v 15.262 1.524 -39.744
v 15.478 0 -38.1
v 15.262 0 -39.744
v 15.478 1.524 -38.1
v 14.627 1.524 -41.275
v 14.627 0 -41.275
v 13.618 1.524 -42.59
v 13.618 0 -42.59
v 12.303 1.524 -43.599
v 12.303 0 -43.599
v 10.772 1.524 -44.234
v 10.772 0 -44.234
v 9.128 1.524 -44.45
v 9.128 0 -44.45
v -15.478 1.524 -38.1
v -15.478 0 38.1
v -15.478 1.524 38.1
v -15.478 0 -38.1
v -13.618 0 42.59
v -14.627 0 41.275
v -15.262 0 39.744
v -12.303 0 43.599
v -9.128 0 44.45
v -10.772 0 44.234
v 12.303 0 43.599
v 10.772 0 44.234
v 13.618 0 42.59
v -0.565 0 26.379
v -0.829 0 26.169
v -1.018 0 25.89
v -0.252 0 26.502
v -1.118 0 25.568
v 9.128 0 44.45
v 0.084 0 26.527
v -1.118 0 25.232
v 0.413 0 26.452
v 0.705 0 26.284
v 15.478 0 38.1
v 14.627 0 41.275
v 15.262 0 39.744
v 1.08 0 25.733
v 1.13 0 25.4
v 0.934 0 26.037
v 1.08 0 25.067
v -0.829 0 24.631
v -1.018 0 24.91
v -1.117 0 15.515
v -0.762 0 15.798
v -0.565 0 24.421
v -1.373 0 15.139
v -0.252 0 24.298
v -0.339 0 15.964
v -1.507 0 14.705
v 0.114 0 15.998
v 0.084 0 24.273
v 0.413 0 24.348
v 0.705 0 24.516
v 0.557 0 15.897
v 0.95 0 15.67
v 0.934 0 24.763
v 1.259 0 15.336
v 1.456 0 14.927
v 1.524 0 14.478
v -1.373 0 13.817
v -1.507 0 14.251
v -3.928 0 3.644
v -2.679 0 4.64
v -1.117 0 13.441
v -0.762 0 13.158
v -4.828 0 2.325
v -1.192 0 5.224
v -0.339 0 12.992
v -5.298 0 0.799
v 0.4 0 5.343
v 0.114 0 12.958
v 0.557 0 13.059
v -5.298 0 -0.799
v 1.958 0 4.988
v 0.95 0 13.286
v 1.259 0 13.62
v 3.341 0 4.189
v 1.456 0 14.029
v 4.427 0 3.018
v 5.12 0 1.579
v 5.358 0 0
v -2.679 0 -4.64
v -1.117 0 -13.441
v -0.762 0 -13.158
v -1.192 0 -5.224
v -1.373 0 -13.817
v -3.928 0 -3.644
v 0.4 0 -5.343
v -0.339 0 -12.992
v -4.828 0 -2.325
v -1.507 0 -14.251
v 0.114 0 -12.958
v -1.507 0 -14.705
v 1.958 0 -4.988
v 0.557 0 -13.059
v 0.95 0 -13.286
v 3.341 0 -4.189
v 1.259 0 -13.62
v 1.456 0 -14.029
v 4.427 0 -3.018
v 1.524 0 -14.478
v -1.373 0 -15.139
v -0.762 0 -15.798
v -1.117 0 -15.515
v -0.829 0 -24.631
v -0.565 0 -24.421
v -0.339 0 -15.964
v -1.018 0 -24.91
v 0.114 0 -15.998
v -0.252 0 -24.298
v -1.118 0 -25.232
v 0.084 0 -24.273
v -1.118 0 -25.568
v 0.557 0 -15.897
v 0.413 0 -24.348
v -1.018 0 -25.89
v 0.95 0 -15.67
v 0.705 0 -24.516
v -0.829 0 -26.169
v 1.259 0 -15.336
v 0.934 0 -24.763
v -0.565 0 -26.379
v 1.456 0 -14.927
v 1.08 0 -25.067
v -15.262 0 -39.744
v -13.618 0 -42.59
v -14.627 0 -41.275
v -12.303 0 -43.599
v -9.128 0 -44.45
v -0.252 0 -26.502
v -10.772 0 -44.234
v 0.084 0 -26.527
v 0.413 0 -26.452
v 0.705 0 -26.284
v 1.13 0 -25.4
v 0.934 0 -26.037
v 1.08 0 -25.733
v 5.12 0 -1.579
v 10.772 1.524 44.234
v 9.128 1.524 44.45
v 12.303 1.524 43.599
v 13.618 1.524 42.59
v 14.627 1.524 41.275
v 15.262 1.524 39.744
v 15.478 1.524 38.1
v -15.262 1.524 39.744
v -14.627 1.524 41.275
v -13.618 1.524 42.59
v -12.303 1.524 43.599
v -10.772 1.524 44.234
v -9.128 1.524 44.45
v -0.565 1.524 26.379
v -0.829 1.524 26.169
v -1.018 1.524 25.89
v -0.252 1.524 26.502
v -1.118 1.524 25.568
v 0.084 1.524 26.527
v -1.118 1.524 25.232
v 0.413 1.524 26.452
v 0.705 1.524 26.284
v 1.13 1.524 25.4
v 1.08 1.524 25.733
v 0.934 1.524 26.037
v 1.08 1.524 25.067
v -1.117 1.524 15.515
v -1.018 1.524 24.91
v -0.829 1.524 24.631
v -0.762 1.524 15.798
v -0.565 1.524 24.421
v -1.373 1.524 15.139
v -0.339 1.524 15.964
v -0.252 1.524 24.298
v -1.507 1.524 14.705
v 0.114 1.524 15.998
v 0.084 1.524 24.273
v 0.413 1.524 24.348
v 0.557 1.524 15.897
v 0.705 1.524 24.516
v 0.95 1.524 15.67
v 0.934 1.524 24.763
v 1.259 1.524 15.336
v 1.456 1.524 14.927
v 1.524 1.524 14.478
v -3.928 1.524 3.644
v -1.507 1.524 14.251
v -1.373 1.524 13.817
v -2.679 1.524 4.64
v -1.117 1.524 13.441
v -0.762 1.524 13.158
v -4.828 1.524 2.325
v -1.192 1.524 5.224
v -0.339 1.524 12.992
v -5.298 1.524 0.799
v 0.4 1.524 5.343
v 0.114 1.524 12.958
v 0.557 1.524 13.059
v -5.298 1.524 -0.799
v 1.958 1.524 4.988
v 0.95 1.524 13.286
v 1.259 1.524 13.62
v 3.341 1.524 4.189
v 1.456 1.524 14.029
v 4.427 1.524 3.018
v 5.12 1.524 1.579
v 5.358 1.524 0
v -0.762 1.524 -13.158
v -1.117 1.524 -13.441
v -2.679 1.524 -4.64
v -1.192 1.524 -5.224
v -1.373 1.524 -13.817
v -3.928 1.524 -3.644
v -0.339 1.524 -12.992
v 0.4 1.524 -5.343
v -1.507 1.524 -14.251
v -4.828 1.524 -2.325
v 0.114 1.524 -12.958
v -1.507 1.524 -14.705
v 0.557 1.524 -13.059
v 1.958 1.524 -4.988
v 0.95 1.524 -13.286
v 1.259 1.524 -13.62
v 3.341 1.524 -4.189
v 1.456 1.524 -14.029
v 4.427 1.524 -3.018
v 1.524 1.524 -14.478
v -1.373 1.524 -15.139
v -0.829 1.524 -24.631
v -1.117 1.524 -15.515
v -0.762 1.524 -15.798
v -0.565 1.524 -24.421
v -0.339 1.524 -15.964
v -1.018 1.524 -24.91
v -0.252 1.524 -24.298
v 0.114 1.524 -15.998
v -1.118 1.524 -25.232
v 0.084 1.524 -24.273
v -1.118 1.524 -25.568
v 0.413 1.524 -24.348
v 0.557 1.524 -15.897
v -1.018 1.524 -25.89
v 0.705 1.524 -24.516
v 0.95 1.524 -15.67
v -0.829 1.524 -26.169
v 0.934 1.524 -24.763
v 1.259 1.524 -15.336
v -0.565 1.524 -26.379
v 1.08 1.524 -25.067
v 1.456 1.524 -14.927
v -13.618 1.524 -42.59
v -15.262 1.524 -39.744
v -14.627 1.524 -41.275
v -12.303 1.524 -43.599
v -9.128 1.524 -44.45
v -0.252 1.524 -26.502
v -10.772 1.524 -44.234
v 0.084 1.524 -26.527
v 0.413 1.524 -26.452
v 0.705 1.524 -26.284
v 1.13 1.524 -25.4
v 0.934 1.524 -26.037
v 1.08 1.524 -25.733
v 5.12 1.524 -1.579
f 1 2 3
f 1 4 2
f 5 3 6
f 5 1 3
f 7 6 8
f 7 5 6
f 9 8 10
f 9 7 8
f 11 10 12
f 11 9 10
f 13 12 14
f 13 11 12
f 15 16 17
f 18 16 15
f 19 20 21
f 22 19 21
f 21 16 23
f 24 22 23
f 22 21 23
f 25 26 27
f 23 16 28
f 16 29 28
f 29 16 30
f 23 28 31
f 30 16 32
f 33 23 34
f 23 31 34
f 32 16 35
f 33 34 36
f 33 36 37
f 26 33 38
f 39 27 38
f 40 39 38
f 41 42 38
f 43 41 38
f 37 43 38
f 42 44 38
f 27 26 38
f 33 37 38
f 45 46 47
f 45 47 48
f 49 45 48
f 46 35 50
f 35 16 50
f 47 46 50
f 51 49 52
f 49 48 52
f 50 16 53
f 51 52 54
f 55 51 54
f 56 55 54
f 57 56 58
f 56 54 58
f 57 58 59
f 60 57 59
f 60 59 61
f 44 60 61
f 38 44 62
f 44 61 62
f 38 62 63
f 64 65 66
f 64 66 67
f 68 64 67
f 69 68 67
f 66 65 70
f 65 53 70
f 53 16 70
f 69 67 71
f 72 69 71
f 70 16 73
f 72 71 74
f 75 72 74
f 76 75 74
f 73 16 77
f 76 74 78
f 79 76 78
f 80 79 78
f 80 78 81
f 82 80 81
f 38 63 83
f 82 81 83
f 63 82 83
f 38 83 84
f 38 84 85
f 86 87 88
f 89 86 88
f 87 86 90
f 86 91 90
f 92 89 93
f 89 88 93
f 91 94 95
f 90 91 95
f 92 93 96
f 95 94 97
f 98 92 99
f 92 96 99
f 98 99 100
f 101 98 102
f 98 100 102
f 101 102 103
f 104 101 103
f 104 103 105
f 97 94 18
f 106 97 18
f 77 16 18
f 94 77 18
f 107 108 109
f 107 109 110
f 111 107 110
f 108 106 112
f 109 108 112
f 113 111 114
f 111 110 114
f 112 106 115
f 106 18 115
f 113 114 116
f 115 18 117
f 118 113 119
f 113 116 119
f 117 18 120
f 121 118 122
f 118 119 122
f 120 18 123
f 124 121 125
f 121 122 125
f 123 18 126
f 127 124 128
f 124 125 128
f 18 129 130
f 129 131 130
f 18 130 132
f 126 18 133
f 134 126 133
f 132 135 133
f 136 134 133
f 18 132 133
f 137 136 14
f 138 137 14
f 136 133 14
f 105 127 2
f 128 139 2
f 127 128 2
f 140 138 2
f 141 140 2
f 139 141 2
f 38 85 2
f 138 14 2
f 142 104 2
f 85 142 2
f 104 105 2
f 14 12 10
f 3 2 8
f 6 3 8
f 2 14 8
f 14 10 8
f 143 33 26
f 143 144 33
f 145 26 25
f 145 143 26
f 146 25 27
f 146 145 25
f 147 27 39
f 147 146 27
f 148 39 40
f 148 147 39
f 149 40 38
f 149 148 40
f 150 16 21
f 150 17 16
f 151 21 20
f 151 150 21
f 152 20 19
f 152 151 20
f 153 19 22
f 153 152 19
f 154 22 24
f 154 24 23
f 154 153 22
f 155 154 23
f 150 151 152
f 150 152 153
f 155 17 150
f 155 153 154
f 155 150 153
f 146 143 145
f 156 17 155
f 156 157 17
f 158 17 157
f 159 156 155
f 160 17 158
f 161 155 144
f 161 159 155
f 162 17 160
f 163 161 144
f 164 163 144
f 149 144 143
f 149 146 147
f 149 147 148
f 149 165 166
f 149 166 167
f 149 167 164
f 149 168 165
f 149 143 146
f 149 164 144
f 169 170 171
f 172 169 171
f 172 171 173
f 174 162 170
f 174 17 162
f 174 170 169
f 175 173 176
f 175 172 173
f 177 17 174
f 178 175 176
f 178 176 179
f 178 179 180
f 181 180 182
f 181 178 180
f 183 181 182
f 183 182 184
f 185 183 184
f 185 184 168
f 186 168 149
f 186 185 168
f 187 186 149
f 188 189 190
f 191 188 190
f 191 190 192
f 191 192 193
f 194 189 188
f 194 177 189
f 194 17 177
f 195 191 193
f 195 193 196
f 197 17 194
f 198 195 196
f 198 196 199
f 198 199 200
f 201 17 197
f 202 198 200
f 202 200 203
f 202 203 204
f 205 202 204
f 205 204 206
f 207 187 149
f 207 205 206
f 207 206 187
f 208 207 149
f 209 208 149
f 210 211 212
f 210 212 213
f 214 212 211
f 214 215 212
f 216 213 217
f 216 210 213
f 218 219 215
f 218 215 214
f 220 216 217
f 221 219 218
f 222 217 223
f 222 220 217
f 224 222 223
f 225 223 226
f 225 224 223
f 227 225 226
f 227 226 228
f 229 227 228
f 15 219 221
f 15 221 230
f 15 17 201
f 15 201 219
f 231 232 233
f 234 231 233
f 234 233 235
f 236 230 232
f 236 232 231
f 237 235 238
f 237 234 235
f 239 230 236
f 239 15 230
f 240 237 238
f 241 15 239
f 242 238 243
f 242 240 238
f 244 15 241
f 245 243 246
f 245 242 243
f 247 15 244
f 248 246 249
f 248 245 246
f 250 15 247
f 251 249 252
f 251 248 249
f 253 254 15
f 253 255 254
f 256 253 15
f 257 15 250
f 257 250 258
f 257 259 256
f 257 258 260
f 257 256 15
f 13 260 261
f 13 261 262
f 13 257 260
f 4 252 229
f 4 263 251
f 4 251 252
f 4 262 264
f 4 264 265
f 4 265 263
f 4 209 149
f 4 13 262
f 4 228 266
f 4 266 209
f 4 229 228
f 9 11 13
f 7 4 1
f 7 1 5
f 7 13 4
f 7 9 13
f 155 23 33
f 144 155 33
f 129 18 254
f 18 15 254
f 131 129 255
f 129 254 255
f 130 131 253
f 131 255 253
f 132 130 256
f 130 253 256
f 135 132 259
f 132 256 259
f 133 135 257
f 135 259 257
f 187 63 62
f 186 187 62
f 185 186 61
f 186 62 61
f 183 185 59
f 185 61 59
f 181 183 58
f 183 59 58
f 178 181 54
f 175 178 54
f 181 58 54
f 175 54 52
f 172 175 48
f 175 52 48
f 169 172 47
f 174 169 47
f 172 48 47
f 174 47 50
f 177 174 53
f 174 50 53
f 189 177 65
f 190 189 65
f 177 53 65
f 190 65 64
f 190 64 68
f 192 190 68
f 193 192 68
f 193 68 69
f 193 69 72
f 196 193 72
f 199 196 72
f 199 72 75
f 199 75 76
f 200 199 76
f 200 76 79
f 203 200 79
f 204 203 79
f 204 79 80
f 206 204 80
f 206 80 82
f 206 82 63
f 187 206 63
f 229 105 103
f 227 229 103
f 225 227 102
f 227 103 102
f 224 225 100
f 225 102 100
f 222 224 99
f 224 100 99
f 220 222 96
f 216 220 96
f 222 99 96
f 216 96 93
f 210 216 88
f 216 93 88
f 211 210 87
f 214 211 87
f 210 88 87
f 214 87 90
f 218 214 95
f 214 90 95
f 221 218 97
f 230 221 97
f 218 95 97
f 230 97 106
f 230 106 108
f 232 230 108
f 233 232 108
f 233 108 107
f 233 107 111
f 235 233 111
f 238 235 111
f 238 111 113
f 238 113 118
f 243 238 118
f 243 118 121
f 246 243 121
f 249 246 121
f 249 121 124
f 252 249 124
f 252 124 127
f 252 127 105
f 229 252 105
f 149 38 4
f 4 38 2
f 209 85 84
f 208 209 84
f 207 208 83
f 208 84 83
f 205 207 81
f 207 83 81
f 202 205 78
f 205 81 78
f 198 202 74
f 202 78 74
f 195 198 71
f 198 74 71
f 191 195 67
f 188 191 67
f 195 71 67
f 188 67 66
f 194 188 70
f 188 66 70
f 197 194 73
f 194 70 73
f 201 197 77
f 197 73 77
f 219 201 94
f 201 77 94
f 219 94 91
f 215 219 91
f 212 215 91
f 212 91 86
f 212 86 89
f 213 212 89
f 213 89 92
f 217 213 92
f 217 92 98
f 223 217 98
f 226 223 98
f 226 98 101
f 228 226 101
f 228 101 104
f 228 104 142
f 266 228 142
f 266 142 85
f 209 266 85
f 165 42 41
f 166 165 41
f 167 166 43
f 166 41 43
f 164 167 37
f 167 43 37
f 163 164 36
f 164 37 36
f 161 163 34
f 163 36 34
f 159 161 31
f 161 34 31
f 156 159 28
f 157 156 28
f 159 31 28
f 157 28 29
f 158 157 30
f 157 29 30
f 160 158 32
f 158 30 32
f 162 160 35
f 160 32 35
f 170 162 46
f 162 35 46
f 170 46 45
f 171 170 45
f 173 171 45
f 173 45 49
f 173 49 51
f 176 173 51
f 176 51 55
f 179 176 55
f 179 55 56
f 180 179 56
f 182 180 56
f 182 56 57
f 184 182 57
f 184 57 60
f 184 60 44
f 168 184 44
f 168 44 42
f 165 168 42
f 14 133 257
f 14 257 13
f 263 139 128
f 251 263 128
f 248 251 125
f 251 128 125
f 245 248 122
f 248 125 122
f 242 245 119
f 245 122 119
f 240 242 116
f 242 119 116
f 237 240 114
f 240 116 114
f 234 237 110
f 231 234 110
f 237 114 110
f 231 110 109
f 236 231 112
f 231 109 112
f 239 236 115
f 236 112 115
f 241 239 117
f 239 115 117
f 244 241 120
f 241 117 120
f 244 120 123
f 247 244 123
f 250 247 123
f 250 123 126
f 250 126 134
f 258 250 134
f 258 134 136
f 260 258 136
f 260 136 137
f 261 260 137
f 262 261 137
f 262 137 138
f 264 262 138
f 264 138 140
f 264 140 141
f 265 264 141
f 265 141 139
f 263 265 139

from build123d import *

# Parameters (mm, degrees)
SKETCH1_W               = 30.95625
SKETCH1_H               = 88.9
BOSS_EXTRUDE1_DEPTH     = 1.524
FILLET1_R               = 6.35
SKETCH6_R               = 1.524
CUT_EXTRUDE1_DEPTH      = 2.524
F_4_40_TAPPED_HOLE1_D   = 2.2606
F_1_2_13_TAPPED_HOLE1_D = 10.71626


with BuildPart() as part:
    # Sketch1 → Boss-Extrude1 (new body)
    with BuildSketch(Plane(origin=(0, 0, 0), x_dir=(1, 0, 0), z_dir=(0, 1, 0))):
        Rectangle(SKETCH1_W, SKETCH1_H)
    extrude(amount=BOSS_EXTRUDE1_DEPTH)

    # Fillet1
    fillet1_edges = [part.edges().sort_by_distance(p)[0] for p in [
        (15.478125, 0.762, -44.45),
        (15.478125, 0.762, 44.45),
        (-15.478125, 0.762, 44.45),
        (-15.478125, 0.762, -44.45),
    ]]
    fillet(fillet1_edges, radius=FILLET1_R)

    # Sketch6 → Cut-Extrude1 (cut, through all)
    with BuildSketch(Plane.XZ):
        with Locations((0, 14.478)):
            Circle(SKETCH6_R)
        with Locations((0, -14.478)):
            Circle(SKETCH6_R)
    extrude(amount=-CUT_EXTRUDE1_DEPTH, mode=Mode.SUBTRACT)

    # #4-40 Tapped Hole1 (through all)
    with Locations(Plane(origin=(0, 1.524, 0), x_dir=(-1, 0, 0), z_dir=(0, 1, 0))):
        with Locations((0, 25.4), (0, -25.4)):
            Hole(F_4_40_TAPPED_HOLE1_D / 2)

    # 1/2-13 Tapped Hole1 (through all)
    with Locations(Plane(origin=(0, 1.524, 0), x_dir=(-1, 0, 0), z_dir=(0, 1, 0))):
        with Locations((0, 0)):
            Hole(F_1_2_13_TAPPED_HOLE1_D / 2)


solid = part.part
